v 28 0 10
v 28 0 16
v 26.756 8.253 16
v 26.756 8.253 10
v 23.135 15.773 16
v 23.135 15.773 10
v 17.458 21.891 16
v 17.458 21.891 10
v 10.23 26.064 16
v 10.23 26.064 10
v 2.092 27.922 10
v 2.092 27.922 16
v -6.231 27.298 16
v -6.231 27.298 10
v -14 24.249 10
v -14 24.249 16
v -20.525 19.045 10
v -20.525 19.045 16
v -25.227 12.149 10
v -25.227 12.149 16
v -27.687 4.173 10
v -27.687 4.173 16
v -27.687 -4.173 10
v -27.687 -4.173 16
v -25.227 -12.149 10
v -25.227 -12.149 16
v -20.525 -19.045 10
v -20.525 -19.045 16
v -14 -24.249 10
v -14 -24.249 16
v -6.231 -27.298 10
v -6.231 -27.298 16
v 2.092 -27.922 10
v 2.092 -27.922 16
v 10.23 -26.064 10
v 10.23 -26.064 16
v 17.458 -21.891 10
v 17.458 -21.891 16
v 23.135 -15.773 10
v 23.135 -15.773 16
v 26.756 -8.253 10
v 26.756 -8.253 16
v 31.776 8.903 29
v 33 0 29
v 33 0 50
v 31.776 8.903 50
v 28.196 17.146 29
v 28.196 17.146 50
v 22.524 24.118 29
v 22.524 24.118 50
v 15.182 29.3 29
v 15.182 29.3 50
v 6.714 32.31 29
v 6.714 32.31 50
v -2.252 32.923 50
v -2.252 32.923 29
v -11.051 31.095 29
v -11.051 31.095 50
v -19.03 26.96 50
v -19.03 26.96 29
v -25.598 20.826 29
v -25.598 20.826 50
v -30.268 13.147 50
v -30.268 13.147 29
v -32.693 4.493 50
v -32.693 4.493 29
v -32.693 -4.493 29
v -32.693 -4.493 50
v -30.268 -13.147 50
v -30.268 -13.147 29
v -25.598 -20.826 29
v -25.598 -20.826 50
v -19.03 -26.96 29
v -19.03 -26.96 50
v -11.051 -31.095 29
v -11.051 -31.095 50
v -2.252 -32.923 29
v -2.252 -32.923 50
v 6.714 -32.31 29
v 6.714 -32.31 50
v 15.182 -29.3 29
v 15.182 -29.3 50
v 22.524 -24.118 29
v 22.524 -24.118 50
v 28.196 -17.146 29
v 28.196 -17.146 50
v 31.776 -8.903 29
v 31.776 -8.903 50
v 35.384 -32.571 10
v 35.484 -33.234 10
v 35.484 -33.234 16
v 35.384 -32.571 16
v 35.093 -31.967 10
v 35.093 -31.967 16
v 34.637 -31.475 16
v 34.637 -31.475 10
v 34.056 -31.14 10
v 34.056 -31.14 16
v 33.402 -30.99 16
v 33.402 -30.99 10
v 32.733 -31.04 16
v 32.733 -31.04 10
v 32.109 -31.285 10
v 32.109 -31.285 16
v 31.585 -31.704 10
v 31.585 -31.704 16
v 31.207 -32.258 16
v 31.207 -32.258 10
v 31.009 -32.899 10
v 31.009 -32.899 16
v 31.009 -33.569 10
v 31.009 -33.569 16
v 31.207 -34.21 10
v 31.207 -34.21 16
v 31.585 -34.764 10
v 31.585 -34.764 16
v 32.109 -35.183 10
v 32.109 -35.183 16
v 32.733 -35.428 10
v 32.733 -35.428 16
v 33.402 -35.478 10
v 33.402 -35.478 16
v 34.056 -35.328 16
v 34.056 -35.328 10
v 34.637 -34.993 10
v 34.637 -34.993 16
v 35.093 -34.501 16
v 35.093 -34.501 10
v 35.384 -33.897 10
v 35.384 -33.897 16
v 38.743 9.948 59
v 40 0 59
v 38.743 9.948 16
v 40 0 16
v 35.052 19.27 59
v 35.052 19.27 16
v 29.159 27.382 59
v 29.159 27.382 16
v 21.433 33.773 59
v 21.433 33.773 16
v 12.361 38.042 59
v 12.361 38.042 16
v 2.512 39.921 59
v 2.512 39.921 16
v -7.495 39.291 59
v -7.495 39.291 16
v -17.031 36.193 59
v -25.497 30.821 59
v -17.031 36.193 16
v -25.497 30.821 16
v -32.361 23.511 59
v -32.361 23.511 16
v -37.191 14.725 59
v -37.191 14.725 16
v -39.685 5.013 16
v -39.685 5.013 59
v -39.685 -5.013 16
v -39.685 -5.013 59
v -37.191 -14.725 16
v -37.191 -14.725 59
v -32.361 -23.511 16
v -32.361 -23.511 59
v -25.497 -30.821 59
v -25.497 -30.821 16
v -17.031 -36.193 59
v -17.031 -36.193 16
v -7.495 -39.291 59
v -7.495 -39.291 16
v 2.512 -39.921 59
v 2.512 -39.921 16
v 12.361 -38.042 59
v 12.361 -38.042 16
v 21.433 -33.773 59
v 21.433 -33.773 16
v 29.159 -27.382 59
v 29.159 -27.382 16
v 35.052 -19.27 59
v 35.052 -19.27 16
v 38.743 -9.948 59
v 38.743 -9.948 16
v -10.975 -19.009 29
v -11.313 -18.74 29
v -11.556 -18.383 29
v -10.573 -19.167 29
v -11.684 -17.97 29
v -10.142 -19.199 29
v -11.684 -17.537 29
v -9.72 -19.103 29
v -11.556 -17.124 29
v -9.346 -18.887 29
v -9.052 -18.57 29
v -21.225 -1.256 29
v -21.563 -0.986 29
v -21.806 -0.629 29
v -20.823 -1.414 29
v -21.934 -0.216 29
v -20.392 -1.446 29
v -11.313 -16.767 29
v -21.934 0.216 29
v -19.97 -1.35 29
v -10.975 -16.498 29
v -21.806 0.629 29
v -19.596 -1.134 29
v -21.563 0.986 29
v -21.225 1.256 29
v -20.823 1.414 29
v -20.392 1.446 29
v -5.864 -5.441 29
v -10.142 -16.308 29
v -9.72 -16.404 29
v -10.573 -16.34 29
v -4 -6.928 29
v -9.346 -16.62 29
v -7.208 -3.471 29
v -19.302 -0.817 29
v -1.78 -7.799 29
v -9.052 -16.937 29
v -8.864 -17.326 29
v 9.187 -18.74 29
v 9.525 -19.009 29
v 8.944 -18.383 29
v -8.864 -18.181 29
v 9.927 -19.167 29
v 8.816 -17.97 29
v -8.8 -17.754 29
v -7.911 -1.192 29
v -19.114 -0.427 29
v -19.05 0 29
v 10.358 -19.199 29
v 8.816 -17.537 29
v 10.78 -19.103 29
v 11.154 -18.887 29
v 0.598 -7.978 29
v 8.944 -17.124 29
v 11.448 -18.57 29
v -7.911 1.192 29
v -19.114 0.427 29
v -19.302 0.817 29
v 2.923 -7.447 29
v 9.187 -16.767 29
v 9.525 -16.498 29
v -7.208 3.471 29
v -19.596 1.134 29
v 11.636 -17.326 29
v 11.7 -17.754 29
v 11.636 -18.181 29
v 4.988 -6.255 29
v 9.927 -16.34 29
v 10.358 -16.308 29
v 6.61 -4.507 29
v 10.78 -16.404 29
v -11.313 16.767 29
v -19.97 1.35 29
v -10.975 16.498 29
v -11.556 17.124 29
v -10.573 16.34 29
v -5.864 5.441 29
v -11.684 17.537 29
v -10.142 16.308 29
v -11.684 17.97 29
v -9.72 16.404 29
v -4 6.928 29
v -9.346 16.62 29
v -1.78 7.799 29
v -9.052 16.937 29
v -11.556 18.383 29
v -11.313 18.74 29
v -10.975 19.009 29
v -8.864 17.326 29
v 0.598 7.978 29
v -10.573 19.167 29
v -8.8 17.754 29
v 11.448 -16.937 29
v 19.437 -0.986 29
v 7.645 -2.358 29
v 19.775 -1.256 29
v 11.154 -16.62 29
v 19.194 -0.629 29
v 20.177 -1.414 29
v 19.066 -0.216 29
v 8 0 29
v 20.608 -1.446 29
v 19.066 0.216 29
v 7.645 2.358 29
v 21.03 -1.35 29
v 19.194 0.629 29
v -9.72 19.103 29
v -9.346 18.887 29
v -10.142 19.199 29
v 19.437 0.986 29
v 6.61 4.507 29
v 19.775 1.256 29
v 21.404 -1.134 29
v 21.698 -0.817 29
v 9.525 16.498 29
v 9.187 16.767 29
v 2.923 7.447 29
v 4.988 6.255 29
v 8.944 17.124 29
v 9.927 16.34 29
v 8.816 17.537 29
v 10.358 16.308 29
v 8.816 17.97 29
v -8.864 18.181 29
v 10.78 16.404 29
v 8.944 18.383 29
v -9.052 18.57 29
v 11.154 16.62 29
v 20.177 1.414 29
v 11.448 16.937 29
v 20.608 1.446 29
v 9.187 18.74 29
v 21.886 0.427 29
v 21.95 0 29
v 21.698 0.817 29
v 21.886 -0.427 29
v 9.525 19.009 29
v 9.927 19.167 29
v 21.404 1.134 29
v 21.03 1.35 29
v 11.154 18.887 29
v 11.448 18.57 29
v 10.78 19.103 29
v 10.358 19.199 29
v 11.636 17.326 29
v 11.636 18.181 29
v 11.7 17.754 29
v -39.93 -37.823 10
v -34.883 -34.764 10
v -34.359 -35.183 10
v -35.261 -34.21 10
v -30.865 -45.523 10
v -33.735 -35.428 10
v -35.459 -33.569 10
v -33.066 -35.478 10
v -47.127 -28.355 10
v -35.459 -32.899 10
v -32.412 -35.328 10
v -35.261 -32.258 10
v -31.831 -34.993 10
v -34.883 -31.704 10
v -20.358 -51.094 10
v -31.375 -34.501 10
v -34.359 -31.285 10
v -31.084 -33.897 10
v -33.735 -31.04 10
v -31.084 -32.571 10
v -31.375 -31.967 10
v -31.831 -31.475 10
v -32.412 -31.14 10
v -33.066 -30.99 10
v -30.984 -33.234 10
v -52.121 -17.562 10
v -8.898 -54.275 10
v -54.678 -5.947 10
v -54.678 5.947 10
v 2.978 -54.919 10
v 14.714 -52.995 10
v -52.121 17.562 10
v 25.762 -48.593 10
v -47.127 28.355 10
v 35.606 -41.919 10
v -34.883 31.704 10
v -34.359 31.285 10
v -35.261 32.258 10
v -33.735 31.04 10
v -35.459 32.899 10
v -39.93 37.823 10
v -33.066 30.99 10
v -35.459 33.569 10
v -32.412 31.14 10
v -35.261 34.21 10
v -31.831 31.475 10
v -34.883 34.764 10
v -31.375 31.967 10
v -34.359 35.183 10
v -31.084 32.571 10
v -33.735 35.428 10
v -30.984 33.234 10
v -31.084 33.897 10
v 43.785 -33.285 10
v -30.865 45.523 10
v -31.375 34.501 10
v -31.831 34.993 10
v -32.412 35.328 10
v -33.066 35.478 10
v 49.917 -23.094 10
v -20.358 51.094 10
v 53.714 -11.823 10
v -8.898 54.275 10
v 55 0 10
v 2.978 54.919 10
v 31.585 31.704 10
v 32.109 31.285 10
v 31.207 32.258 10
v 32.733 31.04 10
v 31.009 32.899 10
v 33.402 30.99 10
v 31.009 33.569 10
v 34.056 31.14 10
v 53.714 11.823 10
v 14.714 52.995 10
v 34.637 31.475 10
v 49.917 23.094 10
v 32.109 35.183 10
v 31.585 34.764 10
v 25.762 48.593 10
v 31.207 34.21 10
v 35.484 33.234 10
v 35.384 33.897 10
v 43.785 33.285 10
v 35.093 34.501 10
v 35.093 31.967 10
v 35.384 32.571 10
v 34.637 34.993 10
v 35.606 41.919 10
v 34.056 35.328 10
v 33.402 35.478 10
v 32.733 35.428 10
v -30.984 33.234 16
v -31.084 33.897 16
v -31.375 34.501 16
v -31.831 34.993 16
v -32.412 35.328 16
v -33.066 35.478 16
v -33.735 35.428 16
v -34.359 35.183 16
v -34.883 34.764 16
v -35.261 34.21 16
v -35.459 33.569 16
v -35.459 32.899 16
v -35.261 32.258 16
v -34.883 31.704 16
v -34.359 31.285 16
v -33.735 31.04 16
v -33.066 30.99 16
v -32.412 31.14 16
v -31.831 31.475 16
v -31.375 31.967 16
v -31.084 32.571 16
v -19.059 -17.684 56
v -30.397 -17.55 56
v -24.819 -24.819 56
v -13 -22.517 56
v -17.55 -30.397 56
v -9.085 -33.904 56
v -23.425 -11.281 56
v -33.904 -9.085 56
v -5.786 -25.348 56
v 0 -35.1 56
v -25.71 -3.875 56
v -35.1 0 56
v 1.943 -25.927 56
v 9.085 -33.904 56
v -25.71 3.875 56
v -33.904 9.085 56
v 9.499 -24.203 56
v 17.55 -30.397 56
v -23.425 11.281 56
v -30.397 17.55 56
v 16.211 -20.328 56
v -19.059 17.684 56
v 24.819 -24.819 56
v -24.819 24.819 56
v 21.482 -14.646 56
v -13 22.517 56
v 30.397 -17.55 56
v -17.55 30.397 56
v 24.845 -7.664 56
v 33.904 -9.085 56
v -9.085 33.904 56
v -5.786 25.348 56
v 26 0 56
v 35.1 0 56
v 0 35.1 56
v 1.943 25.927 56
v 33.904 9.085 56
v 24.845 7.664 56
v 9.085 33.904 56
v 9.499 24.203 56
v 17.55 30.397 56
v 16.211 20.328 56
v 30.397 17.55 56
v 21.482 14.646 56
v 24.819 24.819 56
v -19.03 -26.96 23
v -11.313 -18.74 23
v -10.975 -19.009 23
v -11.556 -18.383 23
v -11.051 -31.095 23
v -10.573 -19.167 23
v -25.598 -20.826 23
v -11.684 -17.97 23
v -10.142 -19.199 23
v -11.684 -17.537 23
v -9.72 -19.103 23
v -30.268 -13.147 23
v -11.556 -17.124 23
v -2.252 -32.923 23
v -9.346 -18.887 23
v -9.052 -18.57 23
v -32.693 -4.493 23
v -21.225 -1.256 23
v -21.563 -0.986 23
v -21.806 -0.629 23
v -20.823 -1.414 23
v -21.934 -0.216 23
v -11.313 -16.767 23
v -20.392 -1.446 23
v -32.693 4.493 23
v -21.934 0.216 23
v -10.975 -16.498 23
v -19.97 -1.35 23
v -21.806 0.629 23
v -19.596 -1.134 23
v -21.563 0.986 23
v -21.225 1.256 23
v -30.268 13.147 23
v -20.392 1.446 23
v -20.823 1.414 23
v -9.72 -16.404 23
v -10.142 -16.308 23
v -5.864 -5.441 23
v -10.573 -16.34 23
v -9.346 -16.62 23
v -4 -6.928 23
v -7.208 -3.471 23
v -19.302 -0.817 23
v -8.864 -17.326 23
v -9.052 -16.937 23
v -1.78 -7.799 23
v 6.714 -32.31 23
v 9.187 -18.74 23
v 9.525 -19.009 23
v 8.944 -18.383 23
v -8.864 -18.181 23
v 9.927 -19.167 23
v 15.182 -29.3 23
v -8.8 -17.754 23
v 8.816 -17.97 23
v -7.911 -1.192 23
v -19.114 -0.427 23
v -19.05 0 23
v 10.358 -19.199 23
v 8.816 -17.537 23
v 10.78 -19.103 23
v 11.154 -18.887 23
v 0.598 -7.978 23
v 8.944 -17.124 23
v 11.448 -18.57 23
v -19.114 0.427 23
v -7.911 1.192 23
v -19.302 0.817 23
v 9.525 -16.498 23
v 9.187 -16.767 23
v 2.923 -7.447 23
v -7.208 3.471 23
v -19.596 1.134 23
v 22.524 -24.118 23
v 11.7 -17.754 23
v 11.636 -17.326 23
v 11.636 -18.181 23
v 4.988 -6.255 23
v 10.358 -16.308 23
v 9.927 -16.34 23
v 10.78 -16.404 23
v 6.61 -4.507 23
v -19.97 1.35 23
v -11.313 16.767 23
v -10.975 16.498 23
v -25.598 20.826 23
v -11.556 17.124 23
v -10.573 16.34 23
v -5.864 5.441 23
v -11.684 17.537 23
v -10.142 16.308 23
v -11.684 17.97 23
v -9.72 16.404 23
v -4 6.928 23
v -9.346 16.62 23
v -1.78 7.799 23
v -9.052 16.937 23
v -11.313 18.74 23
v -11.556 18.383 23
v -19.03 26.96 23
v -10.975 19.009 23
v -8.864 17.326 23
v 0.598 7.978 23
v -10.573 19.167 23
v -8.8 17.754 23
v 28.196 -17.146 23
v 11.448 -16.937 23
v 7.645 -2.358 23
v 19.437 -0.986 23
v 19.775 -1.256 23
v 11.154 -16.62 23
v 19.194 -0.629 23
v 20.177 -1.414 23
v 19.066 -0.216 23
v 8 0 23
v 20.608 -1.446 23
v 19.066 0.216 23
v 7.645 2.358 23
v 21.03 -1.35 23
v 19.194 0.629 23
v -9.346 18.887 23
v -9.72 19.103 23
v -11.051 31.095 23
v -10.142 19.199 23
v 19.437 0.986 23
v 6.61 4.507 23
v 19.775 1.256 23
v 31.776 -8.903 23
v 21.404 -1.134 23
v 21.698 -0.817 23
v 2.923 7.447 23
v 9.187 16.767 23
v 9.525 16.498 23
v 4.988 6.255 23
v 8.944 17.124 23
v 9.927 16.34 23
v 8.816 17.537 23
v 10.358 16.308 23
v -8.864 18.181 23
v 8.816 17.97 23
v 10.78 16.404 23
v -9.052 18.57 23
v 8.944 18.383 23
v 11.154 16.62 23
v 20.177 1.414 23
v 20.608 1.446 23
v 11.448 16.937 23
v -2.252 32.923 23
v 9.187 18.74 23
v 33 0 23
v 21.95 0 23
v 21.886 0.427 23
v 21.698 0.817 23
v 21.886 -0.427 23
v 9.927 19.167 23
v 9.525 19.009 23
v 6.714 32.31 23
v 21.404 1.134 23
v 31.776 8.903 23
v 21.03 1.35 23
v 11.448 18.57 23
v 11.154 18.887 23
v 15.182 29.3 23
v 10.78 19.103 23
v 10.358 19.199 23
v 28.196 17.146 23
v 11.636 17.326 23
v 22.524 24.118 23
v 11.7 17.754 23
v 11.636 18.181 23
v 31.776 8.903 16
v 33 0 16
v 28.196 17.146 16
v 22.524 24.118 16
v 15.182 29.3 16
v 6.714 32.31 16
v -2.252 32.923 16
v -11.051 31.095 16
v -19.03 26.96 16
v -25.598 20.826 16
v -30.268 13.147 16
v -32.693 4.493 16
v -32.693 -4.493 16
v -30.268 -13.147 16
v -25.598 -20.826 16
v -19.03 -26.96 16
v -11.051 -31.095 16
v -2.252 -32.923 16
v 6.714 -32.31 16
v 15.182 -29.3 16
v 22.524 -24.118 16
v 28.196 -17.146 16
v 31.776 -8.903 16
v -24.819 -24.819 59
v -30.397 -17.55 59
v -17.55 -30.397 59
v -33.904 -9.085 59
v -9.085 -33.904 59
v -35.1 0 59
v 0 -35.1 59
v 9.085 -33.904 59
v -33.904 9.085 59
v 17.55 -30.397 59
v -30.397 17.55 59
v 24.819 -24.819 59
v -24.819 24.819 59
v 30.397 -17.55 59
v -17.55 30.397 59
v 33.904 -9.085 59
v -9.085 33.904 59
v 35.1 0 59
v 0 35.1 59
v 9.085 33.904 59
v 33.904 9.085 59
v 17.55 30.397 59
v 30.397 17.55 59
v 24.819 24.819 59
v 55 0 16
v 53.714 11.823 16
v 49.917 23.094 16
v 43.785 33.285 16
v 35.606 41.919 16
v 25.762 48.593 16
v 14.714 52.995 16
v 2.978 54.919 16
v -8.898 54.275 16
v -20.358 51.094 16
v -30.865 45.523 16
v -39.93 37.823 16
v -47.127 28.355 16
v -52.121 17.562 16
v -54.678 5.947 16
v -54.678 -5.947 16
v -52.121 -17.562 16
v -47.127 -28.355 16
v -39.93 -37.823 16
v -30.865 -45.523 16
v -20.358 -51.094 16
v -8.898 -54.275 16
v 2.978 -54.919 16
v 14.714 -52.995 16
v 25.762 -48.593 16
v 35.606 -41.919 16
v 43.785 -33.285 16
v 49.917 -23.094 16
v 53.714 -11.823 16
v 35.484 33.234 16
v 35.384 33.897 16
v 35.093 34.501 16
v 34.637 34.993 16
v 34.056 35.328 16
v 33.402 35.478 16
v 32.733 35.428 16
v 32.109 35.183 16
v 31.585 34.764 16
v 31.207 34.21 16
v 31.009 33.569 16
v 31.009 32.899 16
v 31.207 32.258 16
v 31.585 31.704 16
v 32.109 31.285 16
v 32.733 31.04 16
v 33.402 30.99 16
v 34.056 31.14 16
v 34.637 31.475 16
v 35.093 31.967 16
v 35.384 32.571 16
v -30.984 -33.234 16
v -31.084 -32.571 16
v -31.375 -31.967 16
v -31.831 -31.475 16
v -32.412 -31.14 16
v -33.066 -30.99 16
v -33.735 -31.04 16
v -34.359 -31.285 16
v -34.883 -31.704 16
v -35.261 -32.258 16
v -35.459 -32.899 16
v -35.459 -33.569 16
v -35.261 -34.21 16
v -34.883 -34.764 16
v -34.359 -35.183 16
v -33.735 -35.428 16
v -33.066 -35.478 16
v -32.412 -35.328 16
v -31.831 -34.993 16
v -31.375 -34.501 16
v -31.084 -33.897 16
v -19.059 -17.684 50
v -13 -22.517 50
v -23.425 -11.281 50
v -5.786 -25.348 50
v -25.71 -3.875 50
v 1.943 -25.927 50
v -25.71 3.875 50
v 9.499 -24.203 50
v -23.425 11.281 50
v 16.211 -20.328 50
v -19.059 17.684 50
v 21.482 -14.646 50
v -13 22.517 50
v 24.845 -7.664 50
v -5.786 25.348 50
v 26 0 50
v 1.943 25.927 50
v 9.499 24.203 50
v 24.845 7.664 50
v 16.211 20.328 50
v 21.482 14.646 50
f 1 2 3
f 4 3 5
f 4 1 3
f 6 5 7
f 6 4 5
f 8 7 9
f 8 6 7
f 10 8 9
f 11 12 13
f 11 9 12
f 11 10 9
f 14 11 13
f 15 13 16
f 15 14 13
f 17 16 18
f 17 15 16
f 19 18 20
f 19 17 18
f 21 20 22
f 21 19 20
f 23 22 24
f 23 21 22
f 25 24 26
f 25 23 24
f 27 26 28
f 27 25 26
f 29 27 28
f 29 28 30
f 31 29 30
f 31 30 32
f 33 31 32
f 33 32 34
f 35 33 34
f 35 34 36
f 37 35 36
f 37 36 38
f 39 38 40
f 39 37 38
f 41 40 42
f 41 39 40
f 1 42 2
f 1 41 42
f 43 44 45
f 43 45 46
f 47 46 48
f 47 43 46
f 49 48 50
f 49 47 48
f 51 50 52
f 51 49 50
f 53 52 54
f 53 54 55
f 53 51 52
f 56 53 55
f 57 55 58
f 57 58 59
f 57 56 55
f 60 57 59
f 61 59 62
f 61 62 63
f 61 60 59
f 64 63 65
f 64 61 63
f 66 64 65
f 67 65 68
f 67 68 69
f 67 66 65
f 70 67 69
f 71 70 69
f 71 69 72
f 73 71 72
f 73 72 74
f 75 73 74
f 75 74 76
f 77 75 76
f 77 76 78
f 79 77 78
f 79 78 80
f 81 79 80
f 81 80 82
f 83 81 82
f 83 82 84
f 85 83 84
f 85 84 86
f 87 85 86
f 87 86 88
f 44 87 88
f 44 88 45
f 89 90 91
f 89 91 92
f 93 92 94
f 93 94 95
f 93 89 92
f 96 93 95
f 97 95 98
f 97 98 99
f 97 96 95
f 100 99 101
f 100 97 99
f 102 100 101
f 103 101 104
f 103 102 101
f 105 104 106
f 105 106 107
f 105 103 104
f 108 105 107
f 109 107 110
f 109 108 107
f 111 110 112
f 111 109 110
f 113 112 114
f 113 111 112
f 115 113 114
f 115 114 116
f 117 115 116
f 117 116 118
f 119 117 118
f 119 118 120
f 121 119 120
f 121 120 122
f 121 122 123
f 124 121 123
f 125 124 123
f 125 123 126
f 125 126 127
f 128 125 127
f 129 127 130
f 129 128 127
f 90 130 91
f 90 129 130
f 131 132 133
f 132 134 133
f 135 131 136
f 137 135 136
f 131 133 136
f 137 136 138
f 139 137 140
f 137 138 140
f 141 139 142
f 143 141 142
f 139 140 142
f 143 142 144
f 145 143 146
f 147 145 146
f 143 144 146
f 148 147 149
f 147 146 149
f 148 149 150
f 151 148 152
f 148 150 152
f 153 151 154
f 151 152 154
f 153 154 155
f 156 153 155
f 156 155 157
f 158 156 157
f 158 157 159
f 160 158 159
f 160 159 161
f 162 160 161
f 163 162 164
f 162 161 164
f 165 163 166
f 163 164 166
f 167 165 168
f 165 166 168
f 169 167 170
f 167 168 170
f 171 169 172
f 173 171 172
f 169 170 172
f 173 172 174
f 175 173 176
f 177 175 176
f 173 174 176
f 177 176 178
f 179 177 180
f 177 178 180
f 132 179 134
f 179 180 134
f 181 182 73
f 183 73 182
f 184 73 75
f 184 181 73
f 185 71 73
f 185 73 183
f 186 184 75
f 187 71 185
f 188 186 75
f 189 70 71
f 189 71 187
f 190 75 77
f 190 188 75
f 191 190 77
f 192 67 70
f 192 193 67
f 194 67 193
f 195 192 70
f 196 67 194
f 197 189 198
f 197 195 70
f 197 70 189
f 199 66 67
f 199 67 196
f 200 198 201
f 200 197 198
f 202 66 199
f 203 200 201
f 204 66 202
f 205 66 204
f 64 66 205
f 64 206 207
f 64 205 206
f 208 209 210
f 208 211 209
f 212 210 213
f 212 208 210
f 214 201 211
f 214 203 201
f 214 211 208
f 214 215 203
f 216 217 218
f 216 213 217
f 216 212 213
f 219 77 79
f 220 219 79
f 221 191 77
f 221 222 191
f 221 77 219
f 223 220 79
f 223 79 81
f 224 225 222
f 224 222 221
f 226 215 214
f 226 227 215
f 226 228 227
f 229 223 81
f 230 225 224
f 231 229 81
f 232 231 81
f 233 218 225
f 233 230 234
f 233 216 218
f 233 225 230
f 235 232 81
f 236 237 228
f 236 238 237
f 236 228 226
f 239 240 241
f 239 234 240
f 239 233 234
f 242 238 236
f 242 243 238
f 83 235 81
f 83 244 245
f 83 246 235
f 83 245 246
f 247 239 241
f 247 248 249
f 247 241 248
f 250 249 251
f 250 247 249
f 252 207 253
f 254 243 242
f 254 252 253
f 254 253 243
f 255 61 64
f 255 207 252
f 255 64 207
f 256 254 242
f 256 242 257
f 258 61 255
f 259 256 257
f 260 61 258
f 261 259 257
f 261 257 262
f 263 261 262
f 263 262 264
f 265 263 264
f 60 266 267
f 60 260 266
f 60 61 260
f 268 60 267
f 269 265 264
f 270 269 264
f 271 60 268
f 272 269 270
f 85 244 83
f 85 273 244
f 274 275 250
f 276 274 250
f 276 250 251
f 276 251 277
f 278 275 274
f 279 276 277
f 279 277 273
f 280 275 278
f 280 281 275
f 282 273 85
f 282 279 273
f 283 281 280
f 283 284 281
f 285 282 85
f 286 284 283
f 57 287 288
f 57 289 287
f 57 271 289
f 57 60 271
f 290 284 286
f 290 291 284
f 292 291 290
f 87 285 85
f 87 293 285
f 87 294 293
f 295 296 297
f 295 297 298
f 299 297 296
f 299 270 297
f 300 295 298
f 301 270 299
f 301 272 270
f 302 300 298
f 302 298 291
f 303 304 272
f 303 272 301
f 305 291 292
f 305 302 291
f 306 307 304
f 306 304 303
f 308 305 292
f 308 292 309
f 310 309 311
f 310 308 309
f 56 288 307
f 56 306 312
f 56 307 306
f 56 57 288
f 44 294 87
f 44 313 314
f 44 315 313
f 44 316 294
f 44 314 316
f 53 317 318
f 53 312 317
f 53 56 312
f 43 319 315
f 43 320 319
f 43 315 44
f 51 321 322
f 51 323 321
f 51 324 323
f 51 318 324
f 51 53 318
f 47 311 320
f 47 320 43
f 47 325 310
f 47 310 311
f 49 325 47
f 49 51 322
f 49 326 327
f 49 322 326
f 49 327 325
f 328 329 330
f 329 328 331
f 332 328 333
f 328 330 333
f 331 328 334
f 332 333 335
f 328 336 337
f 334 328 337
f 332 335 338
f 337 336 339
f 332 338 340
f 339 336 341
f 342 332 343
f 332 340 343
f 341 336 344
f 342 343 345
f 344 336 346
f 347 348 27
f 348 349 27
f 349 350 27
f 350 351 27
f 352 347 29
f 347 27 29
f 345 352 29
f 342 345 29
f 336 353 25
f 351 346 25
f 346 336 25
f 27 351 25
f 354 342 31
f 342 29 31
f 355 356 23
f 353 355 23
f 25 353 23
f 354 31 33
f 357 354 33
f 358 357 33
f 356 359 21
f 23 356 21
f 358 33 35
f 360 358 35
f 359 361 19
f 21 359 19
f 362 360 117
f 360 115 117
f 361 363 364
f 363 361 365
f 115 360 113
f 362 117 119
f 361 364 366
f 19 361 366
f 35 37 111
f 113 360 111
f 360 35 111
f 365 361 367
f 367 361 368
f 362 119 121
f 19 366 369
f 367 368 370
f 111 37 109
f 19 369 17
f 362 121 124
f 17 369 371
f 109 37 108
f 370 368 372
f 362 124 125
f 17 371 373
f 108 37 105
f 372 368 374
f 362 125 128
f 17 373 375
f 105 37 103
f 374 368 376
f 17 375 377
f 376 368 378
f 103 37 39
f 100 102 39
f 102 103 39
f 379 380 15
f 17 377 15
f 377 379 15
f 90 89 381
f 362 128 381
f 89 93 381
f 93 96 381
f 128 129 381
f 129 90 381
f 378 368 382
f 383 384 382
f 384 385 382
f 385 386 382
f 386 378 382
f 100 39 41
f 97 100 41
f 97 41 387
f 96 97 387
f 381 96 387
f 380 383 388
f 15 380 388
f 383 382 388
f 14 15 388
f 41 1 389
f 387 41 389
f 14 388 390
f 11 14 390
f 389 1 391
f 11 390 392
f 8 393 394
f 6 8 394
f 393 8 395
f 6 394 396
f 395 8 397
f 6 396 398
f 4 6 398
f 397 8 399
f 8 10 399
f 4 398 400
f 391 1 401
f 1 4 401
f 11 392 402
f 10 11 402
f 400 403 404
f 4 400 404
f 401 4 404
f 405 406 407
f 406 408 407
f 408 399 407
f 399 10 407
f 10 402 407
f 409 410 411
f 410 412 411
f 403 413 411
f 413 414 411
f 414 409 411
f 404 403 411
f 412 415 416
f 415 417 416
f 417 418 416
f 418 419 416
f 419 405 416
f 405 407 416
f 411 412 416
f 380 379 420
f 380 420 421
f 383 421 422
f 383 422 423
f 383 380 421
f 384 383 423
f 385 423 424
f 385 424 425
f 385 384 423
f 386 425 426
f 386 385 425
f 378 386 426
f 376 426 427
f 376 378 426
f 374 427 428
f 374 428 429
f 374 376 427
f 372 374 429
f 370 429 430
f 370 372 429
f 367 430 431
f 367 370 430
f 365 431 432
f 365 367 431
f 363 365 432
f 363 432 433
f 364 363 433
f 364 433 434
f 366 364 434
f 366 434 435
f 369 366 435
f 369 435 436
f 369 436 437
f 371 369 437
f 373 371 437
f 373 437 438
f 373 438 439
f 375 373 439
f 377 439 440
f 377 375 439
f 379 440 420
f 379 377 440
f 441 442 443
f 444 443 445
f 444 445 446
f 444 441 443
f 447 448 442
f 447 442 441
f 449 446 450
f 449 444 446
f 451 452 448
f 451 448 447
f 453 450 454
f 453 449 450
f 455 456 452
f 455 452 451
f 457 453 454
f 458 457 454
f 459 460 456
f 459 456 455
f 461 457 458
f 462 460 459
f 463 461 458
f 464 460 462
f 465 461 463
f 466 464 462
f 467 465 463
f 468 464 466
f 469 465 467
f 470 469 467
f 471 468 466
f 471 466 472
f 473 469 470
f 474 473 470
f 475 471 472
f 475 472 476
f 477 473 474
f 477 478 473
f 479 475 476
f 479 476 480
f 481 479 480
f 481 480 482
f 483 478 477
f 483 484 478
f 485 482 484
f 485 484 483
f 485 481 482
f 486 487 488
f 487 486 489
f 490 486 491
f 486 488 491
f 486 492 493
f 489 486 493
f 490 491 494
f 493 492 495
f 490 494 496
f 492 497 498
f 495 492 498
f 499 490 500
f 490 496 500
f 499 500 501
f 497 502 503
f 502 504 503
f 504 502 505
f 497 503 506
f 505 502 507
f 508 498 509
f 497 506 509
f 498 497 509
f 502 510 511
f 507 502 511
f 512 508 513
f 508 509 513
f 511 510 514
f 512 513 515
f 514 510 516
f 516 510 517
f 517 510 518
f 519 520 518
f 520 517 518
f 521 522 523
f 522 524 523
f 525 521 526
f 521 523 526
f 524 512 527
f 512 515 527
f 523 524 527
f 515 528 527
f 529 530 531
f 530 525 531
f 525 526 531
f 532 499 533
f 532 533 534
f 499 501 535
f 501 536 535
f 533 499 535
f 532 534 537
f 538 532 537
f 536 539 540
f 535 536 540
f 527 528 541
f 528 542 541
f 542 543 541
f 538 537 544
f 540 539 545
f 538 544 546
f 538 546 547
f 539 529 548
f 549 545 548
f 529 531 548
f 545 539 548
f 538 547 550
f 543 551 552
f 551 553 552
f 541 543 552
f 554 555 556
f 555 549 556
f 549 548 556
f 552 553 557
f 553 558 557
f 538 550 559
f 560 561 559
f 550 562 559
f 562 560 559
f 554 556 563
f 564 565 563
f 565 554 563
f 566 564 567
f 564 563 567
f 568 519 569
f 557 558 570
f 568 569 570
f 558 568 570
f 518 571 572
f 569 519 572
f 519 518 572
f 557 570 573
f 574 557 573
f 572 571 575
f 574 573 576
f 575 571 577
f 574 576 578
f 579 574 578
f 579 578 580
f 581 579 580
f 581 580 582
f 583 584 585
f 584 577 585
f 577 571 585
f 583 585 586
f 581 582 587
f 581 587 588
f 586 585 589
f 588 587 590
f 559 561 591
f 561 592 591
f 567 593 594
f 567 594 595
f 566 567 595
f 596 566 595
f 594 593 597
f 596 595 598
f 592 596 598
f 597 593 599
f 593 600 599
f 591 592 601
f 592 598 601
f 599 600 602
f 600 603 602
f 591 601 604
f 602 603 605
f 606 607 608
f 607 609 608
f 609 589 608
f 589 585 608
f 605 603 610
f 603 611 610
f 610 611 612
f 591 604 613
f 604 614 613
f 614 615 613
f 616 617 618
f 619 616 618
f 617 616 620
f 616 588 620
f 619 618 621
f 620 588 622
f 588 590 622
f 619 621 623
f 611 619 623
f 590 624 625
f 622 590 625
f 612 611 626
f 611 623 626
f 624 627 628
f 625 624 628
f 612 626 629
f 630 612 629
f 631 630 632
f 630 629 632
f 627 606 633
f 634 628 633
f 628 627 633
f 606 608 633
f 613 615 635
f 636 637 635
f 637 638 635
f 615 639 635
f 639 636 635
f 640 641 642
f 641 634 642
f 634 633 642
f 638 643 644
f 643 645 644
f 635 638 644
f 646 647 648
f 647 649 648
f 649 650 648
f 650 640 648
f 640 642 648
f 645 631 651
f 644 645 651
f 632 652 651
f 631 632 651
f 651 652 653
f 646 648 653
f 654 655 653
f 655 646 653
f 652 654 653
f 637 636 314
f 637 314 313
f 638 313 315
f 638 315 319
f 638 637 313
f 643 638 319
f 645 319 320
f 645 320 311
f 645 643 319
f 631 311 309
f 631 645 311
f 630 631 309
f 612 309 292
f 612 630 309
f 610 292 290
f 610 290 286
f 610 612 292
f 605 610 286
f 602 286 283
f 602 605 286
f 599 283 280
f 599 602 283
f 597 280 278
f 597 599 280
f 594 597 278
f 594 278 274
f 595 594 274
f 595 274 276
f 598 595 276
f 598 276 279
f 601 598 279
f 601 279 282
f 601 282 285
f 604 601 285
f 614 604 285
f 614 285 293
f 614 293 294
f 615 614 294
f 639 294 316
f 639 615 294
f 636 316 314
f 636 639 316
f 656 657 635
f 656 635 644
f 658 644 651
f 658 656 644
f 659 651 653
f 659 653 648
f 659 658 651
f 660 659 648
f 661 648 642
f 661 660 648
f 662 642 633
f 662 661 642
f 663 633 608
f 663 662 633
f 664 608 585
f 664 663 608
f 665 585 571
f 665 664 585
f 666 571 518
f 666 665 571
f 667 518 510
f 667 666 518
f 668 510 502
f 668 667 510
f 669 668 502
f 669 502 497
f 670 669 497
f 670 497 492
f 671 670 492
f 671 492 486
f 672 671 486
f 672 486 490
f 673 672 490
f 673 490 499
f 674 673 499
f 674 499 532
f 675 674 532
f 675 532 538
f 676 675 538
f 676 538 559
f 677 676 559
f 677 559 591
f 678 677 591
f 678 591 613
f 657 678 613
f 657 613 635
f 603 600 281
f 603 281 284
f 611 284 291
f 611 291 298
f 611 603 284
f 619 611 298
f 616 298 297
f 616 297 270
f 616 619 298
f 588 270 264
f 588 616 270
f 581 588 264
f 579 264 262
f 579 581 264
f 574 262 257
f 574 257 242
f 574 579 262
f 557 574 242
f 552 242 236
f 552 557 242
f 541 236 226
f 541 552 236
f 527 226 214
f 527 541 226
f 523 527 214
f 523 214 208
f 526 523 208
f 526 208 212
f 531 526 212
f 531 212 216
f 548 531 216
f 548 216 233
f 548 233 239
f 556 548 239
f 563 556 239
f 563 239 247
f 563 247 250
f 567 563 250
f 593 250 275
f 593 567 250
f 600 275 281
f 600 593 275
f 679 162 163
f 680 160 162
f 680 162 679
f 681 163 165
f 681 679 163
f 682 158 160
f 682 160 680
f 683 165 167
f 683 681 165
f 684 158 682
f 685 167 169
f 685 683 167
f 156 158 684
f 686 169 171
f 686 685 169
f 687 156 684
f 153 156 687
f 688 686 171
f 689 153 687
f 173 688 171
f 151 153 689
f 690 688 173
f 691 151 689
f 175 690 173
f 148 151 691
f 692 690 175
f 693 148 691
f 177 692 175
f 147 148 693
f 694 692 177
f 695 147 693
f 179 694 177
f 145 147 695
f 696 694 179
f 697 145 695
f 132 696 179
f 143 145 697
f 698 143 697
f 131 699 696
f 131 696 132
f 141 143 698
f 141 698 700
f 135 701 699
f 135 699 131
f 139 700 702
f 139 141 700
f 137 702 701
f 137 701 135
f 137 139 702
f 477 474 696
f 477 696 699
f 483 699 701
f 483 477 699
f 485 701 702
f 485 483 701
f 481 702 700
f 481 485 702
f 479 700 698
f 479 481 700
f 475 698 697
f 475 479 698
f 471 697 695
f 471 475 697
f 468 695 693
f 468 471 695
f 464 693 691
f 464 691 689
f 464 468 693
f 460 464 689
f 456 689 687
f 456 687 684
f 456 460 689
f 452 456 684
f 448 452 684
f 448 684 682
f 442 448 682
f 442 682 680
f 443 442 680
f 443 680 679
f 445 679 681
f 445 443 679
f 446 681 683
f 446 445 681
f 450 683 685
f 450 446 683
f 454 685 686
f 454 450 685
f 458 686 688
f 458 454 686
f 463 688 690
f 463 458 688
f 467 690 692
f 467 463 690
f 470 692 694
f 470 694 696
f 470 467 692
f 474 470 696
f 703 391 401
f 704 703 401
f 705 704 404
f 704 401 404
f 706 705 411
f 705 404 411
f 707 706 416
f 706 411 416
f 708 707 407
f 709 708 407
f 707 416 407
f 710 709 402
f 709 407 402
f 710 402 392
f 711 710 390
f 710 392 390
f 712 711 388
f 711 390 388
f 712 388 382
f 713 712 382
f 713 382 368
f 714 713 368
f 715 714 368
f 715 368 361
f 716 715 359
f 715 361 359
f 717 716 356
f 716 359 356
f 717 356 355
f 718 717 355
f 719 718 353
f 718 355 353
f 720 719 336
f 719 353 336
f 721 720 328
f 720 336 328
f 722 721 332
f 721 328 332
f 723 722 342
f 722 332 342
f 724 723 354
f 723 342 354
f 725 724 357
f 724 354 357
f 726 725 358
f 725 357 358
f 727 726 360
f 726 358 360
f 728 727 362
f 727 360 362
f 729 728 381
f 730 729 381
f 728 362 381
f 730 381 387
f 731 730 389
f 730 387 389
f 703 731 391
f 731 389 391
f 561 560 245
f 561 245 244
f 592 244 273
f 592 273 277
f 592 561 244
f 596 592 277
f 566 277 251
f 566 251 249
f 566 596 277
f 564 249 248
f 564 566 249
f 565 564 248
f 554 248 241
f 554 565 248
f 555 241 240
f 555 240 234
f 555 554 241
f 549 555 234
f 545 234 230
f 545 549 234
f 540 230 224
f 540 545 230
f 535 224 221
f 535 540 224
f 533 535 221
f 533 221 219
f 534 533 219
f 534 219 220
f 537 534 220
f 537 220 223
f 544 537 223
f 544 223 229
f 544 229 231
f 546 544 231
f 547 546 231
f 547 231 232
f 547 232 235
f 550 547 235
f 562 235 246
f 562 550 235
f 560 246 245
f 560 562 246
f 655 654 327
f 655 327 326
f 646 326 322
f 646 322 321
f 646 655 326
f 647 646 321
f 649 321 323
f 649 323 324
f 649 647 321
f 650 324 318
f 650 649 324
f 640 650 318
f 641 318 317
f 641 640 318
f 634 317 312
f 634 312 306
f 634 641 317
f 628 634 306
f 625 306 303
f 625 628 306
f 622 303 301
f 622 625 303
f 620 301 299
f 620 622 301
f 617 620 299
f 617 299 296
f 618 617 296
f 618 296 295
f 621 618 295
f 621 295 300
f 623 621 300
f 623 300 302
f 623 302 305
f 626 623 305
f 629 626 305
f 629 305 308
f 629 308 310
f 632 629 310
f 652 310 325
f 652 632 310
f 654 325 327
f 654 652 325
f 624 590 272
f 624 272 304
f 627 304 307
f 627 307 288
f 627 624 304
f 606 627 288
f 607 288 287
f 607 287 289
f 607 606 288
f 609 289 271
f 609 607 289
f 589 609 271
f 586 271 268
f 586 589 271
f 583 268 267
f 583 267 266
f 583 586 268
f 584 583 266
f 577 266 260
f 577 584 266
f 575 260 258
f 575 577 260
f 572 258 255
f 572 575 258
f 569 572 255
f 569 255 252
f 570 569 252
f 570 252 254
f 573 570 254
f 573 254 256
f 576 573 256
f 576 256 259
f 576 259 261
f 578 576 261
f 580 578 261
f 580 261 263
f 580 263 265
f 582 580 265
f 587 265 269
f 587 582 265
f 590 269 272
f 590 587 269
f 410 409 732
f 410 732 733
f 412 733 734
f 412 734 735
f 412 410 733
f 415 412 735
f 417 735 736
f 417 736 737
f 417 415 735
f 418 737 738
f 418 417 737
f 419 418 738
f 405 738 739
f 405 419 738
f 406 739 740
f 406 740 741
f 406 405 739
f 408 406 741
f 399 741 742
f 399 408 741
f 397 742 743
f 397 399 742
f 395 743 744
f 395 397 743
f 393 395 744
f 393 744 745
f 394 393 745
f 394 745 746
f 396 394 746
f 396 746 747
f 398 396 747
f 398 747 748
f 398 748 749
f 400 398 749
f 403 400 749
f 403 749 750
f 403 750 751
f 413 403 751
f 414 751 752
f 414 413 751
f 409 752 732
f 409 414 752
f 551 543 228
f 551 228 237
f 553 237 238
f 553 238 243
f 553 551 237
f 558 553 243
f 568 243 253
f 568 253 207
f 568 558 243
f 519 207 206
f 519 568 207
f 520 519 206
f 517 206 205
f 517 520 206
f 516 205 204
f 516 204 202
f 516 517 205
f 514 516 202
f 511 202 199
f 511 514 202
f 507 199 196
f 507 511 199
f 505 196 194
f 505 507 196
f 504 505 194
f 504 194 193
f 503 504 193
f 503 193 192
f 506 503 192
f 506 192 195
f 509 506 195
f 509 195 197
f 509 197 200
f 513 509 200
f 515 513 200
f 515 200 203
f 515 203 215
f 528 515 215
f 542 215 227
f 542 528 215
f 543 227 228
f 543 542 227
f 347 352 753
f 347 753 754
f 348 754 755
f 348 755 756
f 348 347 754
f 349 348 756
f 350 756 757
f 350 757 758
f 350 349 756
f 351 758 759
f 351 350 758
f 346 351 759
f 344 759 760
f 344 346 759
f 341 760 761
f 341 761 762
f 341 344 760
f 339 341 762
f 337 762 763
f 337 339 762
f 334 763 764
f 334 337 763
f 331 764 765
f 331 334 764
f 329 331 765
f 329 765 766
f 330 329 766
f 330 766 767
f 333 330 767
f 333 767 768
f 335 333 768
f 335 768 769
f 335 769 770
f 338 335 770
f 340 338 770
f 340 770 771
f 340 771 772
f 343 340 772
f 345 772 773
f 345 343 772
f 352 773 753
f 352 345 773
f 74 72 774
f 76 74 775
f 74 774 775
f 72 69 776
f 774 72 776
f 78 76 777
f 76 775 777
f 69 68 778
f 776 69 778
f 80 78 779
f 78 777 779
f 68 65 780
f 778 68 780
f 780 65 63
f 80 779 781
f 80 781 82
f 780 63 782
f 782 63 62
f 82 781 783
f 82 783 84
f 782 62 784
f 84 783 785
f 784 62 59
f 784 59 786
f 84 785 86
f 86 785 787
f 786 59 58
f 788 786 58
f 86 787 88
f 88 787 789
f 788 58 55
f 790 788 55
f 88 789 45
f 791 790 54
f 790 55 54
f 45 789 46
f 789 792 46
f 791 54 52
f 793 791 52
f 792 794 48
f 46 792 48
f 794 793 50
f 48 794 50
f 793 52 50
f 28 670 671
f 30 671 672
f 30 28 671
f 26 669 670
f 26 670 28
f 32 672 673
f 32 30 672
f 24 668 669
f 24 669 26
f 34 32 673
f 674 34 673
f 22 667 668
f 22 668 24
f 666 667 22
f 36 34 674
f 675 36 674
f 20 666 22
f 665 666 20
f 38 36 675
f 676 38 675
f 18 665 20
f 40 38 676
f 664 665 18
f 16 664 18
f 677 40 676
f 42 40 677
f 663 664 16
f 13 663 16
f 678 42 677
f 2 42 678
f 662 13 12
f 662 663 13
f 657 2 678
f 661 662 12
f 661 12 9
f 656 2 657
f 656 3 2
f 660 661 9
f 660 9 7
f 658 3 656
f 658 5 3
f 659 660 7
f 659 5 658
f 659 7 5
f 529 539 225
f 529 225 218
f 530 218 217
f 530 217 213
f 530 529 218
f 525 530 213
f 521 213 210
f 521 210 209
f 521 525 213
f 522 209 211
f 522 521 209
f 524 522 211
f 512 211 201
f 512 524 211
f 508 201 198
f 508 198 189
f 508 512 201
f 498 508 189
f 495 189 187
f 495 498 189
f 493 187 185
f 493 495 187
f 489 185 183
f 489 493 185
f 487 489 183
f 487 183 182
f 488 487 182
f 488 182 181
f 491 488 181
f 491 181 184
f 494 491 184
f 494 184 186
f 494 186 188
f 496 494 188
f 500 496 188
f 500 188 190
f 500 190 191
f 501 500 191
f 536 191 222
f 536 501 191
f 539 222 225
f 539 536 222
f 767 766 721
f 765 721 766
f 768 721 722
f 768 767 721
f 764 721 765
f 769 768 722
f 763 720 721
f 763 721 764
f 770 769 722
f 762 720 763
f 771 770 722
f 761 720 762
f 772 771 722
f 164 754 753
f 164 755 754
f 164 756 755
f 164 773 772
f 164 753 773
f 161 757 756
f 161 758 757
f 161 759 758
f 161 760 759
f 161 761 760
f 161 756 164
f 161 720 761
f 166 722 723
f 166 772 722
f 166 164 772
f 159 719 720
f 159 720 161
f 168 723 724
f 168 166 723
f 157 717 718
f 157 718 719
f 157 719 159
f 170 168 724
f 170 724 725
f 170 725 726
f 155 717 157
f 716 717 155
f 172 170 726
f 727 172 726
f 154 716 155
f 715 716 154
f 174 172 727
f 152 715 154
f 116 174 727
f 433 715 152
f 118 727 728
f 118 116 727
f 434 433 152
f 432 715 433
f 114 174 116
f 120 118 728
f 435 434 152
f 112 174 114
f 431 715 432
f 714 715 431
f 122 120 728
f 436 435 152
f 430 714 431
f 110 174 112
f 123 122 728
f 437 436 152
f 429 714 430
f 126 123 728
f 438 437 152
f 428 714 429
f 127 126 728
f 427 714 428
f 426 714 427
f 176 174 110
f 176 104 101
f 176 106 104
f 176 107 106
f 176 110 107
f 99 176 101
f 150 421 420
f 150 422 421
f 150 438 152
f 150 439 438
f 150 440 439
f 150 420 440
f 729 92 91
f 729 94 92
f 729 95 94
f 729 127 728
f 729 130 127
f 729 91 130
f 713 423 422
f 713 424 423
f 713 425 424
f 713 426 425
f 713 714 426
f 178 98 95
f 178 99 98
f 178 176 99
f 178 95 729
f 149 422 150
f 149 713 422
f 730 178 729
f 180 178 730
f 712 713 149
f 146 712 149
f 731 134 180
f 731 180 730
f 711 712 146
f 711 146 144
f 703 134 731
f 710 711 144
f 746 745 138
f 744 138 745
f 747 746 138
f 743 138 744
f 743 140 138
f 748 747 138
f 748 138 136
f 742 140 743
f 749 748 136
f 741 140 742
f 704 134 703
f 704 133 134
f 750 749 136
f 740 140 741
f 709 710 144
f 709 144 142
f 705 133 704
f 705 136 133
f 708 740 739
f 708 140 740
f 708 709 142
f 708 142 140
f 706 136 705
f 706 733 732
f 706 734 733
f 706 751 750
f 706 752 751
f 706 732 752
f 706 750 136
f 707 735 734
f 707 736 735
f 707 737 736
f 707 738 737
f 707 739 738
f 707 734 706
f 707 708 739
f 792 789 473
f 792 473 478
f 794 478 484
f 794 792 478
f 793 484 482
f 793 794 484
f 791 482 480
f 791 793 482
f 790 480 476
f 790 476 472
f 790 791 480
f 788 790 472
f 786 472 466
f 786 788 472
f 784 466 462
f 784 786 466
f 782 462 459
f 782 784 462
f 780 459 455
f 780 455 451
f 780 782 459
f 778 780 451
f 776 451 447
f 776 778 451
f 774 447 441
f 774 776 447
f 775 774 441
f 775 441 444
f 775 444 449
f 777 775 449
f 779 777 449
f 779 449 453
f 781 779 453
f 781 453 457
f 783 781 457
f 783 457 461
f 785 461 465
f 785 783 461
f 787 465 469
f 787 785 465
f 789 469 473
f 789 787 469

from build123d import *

# Parameters (mm, degrees)
BRIDA_START                               = 10
SK_BRIDA_R                                = 55
BRIDA_DEPTH                               = 6
TUBO_START                                = 16
SK_TUBO_R                                 = 40
SK_TUBO_R_2                               = 33
TUBO_DEPTH                                = 34
ARO_RODAMIENTO_START                      = 50
SK_ARO_RODAMIENTO_R                       = 40
SK_ARO_RODAMIENTO_R_2                     = 26
ARO_RODAMIENTO_DEPTH                      = 6
ASIENTO_ARANDELA_ALOJAMIENTO_51110_START  = 56
SK_ASIENTO_ARANDELA_ALOJAMIENTO_51110_R   = 40
SK_ASIENTO_ARANDELA_ALOJAMIENTO_51110_R_2 = 35.1
ASIENTO_ARANDELA_ALOJAMIENTO_51110_DEPTH  = 3
PLACA_MOTOR_START                         = 23
SK_PLACA_MOTOR_R                          = 33
PLACA_MOTOR_DEPTH                         = 6
HUECO_BRIDA_START                         = 10
SK_HUECO_BRIDA_R                          = 28
HUECO_BRIDA_DEPTH                         = 13
CENTRO_MOTOR_START                        = 23
SK_CENTRO_MOTOR_R                         = 8
CENTRO_MOTOR_DEPTH                        = 6
PASANTES_M2_5_MOTOR_START                 = 23
SK_PASANTES_M2_5_MOTOR_R                  = 1.45
PASANTES_M2_5_MOTOR_DEPTH                 = 6
PASANTES_M4_BRIDA_START                   = 10
SK_PASANTES_M4_BRIDA_R                    = 2.25
PASANTES_M4_BRIDA_DEPTH                   = 6


with BuildPart() as part:
    # Sk_Brida → Brida (new body)
    with BuildSketch(Plane.XY.offset(BRIDA_START)):
        Circle(SK_BRIDA_R)
    extrude(amount=BRIDA_DEPTH)

    # Sk_Tubo → Tubo (add)
    with BuildSketch(Plane.XY.offset(TUBO_START)):
        Circle(SK_TUBO_R)
        Circle(SK_TUBO_R_2, mode=Mode.SUBTRACT)
    extrude(amount=TUBO_DEPTH)

    # Sk_Aro_rodamiento → Aro_rodamiento (add)
    with BuildSketch(Plane.XY.offset(ARO_RODAMIENTO_START)):
        Circle(SK_ARO_RODAMIENTO_R)
        Circle(SK_ARO_RODAMIENTO_R_2, mode=Mode.SUBTRACT)
    extrude(amount=ARO_RODAMIENTO_DEPTH)

    # Sk_Asiento_arandela_alojamiento_51110 → Asiento_arandela_alojamiento_51110 (add)
    with BuildSketch(Plane.XY.offset(ASIENTO_ARANDELA_ALOJAMIENTO_51110_START)):
        Circle(SK_ASIENTO_ARANDELA_ALOJAMIENTO_51110_R)
        Circle(SK_ASIENTO_ARANDELA_ALOJAMIENTO_51110_R_2, mode=Mode.SUBTRACT)
    extrude(amount=ASIENTO_ARANDELA_ALOJAMIENTO_51110_DEPTH)

    # Sk_Placa_motor → Placa_motor (add)
    with BuildSketch(Plane.XY.offset(PLACA_MOTOR_START)):
        Circle(SK_PLACA_MOTOR_R)
    extrude(amount=PLACA_MOTOR_DEPTH)

    # Sk_Hueco_brida → Hueco_brida (cut)
    with BuildSketch(Plane.XY.offset(HUECO_BRIDA_START)):
        Circle(SK_HUECO_BRIDA_R)
    extrude(amount=HUECO_BRIDA_DEPTH, mode=Mode.SUBTRACT)

    # Sk_Centro_motor → Centro_motor (cut)
    with BuildSketch(Plane.XY.offset(CENTRO_MOTOR_START)):
        Circle(SK_CENTRO_MOTOR_R)
    extrude(amount=CENTRO_MOTOR_DEPTH, mode=Mode.SUBTRACT)

    # Sk_Pasantes_M2-5_motor → Pasantes_M2-5_motor (cut)
    with BuildSketch(Plane.XY.offset(PASANTES_M2_5_MOTOR_START)):
        with Locations((20.5, 0)):
            Circle(SK_PASANTES_M2_5_MOTOR_R)
        with Locations((10.25, 17.753520778)):
            Circle(SK_PASANTES_M2_5_MOTOR_R)
        with Locations((-10.25, 17.753520778)):
            Circle(SK_PASANTES_M2_5_MOTOR_R)
        with Locations((-20.5, 0)):
            Circle(SK_PASANTES_M2_5_MOTOR_R)
        with Locations((-10.25, -17.753520778)):
            Circle(SK_PASANTES_M2_5_MOTOR_R)
        with Locations((10.25, -17.753520778)):
            Circle(SK_PASANTES_M2_5_MOTOR_R)
    extrude(amount=PASANTES_M2_5_MOTOR_DEPTH, mode=Mode.SUBTRACT)

    # Sk_Pasantes_M4_brida → Pasantes_M4_brida (cut)
    with BuildSketch(Plane.XY.offset(PASANTES_M4_BRIDA_START)):
        with Locations((33.234018716, 33.234018716)):
            Circle(SK_PASANTES_M4_BRIDA_R)
        with Locations((-33.234018716, 33.234018716)):
            Circle(SK_PASANTES_M4_BRIDA_R)
        with Locations((-33.234018716, -33.234018716)):
            Circle(SK_PASANTES_M4_BRIDA_R)
        with Locations((33.234018716, -33.234018716)):
            Circle(SK_PASANTES_M4_BRIDA_R)
    extrude(amount=PASANTES_M4_BRIDA_DEPTH, mode=Mode.SUBTRACT)


solid = part.part
